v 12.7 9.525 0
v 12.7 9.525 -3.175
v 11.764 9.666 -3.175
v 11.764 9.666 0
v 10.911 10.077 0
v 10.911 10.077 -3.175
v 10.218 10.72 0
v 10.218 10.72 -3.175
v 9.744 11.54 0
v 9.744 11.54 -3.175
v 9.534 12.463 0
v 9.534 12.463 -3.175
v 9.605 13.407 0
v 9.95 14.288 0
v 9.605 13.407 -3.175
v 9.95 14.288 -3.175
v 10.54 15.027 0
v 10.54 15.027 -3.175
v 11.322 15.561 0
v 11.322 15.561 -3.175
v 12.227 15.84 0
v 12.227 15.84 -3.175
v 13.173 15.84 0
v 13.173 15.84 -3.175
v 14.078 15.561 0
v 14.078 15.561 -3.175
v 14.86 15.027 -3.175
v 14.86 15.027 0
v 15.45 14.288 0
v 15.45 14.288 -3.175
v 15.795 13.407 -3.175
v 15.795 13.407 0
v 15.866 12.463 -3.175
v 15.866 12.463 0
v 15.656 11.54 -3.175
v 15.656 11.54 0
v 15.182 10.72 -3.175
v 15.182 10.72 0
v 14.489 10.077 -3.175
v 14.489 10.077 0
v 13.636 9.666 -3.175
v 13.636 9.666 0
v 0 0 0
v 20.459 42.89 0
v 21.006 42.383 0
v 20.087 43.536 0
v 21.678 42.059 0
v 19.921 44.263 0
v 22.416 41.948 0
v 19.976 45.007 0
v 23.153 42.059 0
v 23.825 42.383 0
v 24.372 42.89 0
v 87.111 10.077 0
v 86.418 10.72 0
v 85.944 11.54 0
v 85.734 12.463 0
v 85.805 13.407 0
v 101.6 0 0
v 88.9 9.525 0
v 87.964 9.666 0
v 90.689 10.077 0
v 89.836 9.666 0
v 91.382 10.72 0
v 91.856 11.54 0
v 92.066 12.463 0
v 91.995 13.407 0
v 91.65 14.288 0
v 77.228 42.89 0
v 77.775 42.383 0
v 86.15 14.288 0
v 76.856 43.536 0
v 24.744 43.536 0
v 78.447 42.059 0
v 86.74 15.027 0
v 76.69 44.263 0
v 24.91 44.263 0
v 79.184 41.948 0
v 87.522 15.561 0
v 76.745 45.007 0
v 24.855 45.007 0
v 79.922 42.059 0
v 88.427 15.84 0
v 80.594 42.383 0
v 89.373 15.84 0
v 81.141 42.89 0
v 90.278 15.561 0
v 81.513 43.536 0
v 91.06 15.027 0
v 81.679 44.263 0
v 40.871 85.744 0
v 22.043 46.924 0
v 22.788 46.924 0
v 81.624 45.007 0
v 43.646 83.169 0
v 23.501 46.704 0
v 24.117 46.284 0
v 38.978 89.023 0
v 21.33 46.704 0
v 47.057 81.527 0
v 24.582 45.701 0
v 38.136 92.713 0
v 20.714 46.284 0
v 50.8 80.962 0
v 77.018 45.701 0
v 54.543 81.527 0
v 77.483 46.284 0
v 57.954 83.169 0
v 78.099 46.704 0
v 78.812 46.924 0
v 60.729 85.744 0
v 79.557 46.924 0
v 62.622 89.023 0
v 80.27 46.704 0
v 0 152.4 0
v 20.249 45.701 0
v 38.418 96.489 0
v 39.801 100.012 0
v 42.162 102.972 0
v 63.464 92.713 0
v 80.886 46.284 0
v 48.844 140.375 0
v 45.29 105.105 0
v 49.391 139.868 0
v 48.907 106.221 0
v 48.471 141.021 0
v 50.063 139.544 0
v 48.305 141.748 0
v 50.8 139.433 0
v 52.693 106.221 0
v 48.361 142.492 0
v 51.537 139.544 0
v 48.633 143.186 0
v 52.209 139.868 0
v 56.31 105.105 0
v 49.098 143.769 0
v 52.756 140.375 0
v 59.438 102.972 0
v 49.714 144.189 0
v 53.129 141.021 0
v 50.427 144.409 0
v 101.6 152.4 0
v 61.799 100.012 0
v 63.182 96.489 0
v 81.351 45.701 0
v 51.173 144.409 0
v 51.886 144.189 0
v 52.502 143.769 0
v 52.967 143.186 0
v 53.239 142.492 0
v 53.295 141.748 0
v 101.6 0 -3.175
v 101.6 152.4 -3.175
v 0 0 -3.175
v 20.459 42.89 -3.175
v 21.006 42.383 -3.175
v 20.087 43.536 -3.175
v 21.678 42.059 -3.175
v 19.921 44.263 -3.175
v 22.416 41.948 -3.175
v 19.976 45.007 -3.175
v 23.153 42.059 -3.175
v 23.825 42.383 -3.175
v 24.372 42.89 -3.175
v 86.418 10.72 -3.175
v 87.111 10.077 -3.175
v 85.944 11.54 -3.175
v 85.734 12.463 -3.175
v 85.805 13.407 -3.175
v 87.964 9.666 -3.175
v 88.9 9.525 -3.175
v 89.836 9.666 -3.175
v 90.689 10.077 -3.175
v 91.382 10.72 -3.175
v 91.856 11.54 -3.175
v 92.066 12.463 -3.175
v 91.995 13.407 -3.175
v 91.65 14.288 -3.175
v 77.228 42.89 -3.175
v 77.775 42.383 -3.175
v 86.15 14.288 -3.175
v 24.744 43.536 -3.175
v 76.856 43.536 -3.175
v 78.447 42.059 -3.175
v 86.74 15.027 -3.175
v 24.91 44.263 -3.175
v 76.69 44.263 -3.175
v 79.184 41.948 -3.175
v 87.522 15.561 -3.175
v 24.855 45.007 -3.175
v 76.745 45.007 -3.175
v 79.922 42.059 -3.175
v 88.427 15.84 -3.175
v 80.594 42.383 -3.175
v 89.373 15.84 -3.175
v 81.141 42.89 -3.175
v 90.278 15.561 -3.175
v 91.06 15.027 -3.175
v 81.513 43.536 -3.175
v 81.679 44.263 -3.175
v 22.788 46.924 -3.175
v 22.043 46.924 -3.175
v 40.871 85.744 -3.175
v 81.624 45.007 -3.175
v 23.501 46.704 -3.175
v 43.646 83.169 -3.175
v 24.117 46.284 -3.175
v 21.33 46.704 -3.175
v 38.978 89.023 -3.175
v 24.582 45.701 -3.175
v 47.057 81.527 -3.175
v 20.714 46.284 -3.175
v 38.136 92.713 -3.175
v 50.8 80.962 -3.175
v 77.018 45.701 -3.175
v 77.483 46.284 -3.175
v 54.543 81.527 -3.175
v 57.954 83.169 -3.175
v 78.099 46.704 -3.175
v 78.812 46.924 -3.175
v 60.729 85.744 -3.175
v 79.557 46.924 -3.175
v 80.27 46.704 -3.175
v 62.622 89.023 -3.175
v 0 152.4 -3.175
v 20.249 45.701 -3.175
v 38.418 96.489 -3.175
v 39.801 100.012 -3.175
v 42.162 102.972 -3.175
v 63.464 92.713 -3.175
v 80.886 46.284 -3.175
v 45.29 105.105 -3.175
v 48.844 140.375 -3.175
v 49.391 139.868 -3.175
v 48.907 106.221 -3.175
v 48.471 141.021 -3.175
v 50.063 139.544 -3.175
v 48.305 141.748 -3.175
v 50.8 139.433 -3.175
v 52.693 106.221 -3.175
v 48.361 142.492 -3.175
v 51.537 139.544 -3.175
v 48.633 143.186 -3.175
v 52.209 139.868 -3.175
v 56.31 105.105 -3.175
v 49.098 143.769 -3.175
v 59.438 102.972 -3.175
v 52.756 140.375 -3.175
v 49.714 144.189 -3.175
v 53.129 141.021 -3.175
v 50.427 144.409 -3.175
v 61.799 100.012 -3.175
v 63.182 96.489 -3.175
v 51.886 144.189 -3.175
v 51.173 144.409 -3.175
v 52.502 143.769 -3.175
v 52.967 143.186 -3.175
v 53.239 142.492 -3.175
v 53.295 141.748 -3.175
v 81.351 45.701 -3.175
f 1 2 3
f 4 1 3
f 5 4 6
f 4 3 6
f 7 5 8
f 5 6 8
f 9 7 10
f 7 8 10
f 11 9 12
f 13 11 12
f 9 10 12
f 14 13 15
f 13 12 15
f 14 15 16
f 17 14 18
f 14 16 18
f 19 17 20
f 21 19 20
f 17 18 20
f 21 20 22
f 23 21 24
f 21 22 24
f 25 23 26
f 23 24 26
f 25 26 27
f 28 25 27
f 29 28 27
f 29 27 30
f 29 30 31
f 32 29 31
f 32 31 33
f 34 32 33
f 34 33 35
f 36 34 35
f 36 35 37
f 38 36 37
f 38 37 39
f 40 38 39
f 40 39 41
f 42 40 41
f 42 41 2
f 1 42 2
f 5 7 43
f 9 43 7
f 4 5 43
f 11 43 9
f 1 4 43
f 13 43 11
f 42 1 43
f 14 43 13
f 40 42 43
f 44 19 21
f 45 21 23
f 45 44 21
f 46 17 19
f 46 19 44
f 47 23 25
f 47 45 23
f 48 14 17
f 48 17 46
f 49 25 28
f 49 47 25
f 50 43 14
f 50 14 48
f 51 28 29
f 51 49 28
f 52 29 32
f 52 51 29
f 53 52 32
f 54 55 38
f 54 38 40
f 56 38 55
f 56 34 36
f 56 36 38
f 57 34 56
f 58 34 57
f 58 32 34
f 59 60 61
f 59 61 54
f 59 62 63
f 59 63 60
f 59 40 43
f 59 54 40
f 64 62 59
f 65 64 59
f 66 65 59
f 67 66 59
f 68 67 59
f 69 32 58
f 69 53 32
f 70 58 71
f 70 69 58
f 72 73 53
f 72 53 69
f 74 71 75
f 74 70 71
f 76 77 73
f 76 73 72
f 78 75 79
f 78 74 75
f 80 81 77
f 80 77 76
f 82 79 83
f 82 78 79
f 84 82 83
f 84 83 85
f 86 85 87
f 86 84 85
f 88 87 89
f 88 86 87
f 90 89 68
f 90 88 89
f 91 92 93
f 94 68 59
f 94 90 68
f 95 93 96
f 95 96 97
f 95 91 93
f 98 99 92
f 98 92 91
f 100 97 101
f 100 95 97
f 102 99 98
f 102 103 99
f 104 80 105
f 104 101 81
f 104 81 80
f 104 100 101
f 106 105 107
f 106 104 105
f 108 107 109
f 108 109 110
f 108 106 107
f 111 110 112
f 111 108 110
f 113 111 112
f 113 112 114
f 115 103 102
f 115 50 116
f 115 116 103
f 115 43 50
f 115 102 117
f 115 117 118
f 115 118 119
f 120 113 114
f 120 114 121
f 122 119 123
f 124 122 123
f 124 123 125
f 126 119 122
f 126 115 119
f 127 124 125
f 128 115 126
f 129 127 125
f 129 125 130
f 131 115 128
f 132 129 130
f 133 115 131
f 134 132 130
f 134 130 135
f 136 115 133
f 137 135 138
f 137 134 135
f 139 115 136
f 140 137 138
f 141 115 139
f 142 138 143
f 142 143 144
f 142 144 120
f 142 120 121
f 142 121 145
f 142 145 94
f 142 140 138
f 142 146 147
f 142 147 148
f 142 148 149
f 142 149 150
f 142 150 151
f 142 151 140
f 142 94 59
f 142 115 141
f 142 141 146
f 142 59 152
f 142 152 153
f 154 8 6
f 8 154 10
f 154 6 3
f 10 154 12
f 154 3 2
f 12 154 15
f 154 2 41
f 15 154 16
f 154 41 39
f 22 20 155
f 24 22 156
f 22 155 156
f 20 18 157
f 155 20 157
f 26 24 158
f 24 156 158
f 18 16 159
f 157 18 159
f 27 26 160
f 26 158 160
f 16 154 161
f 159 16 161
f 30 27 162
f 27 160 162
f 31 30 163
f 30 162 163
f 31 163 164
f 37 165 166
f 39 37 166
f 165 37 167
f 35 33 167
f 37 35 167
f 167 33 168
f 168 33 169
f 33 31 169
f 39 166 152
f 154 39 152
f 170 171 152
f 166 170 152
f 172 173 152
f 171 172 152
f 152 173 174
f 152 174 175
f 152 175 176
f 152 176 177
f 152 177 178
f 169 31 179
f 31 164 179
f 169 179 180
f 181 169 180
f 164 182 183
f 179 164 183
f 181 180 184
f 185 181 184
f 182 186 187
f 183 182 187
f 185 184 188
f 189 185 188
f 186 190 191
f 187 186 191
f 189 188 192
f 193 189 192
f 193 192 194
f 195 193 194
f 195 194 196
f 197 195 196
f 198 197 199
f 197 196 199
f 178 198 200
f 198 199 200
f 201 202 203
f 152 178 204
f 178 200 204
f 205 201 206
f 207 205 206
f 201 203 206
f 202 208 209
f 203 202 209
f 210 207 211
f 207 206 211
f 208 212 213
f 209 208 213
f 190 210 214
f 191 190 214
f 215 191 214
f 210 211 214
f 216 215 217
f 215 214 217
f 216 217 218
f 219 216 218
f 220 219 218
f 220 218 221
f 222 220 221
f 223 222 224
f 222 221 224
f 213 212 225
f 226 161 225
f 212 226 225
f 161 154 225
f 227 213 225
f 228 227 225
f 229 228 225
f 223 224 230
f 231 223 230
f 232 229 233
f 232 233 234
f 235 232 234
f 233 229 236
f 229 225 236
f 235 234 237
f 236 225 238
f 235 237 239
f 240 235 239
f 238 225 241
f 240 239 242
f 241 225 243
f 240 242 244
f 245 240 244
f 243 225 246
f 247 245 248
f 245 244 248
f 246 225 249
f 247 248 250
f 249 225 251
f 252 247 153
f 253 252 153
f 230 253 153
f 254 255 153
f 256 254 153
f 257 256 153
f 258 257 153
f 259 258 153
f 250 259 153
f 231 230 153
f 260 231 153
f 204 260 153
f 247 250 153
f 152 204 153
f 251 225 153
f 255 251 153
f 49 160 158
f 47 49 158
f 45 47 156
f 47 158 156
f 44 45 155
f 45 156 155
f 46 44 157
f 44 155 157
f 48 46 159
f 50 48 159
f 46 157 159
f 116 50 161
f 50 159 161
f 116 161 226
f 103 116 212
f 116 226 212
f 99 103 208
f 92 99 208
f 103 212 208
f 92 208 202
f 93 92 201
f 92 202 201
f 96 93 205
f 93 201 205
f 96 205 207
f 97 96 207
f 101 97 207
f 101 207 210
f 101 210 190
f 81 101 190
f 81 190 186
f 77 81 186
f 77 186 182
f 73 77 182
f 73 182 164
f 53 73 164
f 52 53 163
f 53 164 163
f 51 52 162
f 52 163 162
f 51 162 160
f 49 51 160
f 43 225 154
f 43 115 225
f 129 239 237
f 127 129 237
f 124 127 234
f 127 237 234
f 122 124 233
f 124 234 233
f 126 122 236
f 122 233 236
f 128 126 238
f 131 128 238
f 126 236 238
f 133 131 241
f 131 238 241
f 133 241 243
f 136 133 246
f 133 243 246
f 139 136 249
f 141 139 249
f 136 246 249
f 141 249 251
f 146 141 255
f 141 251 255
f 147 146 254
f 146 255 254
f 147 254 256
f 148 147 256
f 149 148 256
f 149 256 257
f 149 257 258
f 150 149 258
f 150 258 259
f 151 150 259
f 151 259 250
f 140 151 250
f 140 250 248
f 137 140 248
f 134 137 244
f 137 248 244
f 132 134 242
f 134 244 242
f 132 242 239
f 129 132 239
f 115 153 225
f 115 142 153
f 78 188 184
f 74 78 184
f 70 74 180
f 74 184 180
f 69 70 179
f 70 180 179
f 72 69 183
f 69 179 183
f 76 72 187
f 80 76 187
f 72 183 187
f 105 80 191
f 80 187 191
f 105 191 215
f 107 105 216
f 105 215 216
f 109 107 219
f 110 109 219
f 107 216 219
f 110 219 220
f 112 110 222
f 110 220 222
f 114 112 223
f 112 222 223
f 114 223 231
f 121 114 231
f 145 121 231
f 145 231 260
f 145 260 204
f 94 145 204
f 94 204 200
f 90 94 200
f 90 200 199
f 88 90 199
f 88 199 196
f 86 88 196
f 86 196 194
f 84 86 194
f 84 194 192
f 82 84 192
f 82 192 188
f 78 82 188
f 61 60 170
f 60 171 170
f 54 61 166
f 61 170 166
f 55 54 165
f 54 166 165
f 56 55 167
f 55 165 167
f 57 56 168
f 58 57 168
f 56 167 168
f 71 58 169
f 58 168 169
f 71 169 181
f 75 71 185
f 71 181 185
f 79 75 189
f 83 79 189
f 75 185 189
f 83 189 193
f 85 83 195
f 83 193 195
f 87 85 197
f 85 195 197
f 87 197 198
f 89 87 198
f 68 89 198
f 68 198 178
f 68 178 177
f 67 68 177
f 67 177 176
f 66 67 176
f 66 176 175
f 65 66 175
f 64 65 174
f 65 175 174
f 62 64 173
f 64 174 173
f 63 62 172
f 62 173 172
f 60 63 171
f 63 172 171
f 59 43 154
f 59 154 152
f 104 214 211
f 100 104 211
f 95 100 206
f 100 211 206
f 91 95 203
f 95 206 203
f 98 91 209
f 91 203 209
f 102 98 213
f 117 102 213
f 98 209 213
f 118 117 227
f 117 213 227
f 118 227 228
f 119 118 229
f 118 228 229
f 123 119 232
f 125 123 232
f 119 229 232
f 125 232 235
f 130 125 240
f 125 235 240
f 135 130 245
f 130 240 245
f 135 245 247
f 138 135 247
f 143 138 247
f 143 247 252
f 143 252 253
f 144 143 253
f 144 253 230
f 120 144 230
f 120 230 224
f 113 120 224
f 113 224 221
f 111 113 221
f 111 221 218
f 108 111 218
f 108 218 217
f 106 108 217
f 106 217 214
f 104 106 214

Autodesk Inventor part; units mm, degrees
ref_plane "YZ Plane" through (0, 0, 0) normal (1, 0, 0) x (0, 1, 0)
ref_plane "XZ Plane" through (0, 0, 0) normal (0, 1, 0) x (-1, 0, 0)
ref_plane "XY Plane" through (0, 0, 0) normal (0, 0, 1) x (1, 0, 0)
sketch "Sketch1" plane through (0, 0, 0) normal (0, 0, 1) x (1, 0, 0)
  line L0 (0, 0) -> (101.6, 0)
  line L1 (101.6, 0) -> (101.6, 152.4)
  line L2 (101.6, 152.4) -> (0, 152.4)
  line L3 (0, 152.4) -> (0, 0)
  point P0 (22.4155, 44.45)
  point P1 (79.1845, 44.45)
  point P2 (50.8, 141.9352)
  point P3 (50.8, 93.6625)
  point P4 (12.7, 12.7)
  point P5 (88.9, 12.7)
  dimension "d0" = 152.4
  dimension "d1" = 101.6
  dimension "d2" = 44.45
  dimension "d3" = 49.2125
  dimension "d4" = 97.4852
  dimension "d5" = 56.769
  dimension "d6" = 28.3845
  dimension "d7" = 12.7
  dimension "d8" = 12.7
  dimension "d9" = 12.7
  dimension "d10" = 50.8
extrude "Extrusion1" add sketch "Sketch1" against normal blind 3.175
hole "Hole1" at (22.4155, 44.45, 0) at (79.1845, 44.45, 0) at (50.8, 141.9352, 0) direction (0, 0, -1) diameter 5.0038 depth 25.4 tip angle 118
hole "Hole2" at (12.7, 12.7, 0) at (88.9, 12.7, 0) direction (0, 0, -1) diameter 6.35 depth 25.4 tip angle 118
hole "Hole3" at (50.8, 93.6625, 0) direction (0, 0, -1) diameter 25.4 depth 25.4 tip angle 118
properties part number "window motor plate"
